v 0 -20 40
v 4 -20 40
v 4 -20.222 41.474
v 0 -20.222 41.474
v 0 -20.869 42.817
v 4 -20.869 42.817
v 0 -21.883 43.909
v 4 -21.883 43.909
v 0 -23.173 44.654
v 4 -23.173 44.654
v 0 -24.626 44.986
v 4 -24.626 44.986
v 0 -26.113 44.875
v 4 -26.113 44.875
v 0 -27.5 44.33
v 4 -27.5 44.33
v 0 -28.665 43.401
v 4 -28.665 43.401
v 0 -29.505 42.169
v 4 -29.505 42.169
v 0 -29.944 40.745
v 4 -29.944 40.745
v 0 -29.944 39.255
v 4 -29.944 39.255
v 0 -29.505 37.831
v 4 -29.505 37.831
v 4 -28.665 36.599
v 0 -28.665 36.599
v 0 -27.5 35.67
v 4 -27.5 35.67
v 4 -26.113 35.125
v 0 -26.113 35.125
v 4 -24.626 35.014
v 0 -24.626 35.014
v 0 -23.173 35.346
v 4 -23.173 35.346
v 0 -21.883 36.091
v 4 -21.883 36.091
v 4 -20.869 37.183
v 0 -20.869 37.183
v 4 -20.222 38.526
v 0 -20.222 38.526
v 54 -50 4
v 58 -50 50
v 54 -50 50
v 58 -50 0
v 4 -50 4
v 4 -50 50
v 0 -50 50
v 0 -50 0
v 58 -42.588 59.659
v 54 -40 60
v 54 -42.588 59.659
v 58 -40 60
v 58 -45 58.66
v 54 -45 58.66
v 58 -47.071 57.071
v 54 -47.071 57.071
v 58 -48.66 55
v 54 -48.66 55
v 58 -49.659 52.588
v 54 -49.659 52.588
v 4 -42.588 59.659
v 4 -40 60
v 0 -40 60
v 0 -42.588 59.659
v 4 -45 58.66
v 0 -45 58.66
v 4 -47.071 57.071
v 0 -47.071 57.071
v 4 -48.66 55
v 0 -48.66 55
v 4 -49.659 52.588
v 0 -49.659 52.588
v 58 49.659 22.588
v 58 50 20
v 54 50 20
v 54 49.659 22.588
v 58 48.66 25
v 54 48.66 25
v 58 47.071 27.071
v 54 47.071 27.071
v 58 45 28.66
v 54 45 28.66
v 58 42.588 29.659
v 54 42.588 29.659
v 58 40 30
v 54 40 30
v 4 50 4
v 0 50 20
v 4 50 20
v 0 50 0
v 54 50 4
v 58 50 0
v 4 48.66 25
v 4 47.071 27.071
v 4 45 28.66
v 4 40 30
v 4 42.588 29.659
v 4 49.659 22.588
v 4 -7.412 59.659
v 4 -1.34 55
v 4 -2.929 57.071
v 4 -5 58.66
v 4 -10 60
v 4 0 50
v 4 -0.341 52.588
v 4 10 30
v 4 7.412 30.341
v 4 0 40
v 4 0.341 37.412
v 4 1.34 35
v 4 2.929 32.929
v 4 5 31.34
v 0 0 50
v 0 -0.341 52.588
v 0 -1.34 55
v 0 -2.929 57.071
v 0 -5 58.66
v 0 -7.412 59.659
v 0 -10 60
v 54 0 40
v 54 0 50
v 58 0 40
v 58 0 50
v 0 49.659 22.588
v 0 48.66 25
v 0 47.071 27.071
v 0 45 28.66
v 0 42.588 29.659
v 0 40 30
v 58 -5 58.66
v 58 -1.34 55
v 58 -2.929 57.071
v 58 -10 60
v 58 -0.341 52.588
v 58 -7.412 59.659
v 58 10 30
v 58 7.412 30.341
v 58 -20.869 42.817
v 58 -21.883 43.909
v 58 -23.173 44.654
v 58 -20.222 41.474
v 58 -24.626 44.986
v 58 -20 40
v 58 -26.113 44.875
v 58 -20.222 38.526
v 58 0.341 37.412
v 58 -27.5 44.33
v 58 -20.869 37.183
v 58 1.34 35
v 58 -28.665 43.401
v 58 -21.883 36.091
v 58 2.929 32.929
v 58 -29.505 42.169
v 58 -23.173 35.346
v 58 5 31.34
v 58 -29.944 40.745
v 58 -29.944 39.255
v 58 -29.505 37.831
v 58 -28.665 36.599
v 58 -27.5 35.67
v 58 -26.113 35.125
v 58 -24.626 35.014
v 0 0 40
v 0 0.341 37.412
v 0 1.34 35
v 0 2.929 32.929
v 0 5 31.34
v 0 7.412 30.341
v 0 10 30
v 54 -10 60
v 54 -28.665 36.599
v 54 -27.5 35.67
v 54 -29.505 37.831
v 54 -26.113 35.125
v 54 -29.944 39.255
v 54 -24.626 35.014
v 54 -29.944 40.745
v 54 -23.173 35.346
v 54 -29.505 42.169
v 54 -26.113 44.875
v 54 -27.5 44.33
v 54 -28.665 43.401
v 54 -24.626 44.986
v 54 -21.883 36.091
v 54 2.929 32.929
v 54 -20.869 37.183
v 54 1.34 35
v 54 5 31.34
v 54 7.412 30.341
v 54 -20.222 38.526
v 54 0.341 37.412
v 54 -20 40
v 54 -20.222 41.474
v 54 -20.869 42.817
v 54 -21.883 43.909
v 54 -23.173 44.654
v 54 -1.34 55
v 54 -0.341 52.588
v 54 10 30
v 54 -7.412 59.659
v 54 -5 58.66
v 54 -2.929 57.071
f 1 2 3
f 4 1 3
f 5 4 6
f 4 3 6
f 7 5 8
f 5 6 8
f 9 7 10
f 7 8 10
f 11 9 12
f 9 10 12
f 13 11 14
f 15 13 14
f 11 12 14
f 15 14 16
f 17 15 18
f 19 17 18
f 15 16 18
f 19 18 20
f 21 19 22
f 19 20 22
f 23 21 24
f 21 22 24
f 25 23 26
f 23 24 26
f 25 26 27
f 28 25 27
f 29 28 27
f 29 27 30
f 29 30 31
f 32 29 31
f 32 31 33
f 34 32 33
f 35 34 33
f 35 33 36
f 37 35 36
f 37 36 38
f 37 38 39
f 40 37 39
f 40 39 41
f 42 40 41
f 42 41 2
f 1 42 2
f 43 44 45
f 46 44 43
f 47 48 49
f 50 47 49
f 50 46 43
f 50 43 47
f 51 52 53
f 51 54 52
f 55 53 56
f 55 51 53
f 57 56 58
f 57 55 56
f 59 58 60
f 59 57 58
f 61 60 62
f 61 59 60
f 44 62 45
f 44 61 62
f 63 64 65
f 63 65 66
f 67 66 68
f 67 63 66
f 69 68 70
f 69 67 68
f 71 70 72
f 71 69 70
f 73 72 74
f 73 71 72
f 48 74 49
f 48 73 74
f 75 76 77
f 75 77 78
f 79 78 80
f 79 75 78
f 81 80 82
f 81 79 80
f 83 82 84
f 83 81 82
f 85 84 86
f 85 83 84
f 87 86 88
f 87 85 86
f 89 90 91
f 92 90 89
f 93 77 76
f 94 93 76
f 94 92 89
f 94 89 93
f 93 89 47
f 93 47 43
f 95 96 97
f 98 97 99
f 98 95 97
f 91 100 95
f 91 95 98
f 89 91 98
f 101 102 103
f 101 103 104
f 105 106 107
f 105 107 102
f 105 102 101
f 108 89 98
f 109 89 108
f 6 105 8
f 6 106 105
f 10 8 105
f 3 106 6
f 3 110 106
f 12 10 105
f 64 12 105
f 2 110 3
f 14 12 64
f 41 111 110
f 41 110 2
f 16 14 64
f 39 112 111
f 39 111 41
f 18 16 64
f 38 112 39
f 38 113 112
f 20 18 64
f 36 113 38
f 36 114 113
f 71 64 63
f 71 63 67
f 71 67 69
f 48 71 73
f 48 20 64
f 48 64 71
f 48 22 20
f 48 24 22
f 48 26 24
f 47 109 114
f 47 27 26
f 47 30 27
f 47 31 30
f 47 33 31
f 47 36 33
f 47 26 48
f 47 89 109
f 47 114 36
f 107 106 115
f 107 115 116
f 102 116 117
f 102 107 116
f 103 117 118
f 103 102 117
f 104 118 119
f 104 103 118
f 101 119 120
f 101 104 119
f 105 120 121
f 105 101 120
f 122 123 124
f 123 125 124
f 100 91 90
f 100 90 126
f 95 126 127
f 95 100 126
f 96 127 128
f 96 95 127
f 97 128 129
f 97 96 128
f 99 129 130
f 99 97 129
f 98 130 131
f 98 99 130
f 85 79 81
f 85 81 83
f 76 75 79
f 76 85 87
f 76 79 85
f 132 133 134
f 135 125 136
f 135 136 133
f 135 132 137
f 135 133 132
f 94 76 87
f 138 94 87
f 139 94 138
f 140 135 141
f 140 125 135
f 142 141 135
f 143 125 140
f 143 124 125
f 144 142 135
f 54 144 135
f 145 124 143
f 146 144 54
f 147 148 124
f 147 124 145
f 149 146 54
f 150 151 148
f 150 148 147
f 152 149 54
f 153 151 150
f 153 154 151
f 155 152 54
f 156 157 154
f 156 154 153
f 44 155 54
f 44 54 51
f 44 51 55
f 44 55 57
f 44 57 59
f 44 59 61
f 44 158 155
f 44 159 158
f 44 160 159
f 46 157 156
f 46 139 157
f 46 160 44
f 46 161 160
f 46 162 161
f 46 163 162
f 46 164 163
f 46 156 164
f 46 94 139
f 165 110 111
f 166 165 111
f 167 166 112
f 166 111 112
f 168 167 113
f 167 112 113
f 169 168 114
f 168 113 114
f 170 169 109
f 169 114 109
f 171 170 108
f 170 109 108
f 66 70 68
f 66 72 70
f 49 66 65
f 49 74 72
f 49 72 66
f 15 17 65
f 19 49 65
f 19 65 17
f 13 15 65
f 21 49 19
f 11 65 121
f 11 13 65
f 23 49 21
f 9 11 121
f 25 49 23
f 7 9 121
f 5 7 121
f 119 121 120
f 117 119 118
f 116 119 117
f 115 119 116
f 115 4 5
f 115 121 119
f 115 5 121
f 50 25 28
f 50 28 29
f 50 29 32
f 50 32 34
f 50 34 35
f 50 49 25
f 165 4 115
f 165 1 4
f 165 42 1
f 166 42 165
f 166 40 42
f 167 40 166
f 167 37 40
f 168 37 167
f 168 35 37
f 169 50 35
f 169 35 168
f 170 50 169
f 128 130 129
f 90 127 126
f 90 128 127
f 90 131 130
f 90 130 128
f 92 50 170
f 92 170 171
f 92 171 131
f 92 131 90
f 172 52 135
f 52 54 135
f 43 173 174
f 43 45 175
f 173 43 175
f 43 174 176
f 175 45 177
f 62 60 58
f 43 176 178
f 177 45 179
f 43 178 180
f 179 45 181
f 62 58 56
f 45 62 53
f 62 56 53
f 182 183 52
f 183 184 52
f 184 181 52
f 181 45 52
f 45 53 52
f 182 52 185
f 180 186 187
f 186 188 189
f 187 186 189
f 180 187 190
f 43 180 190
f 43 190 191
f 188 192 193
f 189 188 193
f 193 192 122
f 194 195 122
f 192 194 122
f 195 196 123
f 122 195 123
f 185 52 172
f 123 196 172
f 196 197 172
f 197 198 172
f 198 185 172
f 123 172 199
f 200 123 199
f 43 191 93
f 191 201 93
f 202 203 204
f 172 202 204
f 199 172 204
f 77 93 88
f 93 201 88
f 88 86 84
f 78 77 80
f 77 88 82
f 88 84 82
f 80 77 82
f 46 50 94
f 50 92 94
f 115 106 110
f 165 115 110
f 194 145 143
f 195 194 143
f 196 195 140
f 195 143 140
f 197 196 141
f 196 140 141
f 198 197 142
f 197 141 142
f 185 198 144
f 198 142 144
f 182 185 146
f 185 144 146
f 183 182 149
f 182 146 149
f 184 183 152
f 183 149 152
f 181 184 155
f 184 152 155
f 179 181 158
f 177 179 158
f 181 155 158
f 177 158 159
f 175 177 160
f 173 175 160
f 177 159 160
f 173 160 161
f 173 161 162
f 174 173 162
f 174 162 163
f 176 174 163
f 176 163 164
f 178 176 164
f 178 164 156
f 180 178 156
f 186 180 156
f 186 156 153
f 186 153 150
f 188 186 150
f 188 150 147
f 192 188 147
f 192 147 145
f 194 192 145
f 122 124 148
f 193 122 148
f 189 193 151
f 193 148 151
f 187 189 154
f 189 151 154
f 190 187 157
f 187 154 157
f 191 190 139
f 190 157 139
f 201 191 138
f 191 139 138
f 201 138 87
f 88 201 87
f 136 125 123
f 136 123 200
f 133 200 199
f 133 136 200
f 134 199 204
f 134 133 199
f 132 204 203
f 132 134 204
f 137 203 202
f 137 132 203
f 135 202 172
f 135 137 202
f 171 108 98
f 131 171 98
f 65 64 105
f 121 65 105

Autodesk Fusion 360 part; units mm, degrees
sketch "Boceto1" plane through (0, 0, 0) normal (0, 0, 1) x (1, 0, 0)
  line L0 (0, 0) -> (0, 50)
  line L1 (0, 0) -> (0, -50)
  line L2 (0, 50) -> (58, 50)
  line L3 (58, 50) -> (58, -50)
  line L4 (58, -50) -> (0, -50)
extrude "Extruir1" add sketch "Boceto1" along normal blind 4 makes body 1
sketch "Boceto2" plane through (0, 0, 0) normal (0, 1, 0) x (1, 0, 0)
sketch "Boceto3" plane through (58, 0, 0) normal (1, 0, 0) x (0, 1, 0)
  line L0 (-50, 0) -> (50, 0)
  line L1 (50, 0) -> (50, 4)
  line L2 (50, 4) -> (-50, 4)
  line L3 (-50, 4) -> (-50, 0)
  line L4 (-50, 4) -> (-50, 50)
  line L5 (50, 4) -> (50, 20)
  line L6 (-40, 60) -> (-10, 60)
  line L7 (0, 50) -> (0, 40)
  line L8 (10, 30) -> (40, 30)
  arc A0 (-40, 60) -> (-50, 50) centre (-40, 50) ccw
  arc A1 (0, 50) -> (-10, 60) centre (-10, 50) ccw
  arc A2 (0, 40) -> (10, 30) centre (10, 40) ccw
  arc A3 (50, 20) -> (40, 30) centre (40, 20) ccw
  circle A4 centre (-25, 40) radius 5
  dimension "d8" = 10
  dimension "d9" = 10
extrude "Extruir2" add sketch "Boceto3" against normal blind 4 contours L2 L4 L5 L6 L7 L8 A0 A1 A2 A3 | A4 bodies 1
extrude "Extruir3" cut sketch "Boceto3" against normal blind 15 contours A4 bodies 1
split "Dividir1" by plane through (0, 0, 4) normal (0, 0, 1) bodies 1 makes body 2 at (54, 2.859, 12.7006)
copy_body "CopiarPegarCuerpos1" bodies 2 makes body 3
move_body "Desplazar1" bodies 3 to x (1, 0, 0) y (0, 1, 0) z (0, 0, 1) at (-54, 0, 0)
combine "Combinar1" operation add target body 2 tool bodies 3 1
